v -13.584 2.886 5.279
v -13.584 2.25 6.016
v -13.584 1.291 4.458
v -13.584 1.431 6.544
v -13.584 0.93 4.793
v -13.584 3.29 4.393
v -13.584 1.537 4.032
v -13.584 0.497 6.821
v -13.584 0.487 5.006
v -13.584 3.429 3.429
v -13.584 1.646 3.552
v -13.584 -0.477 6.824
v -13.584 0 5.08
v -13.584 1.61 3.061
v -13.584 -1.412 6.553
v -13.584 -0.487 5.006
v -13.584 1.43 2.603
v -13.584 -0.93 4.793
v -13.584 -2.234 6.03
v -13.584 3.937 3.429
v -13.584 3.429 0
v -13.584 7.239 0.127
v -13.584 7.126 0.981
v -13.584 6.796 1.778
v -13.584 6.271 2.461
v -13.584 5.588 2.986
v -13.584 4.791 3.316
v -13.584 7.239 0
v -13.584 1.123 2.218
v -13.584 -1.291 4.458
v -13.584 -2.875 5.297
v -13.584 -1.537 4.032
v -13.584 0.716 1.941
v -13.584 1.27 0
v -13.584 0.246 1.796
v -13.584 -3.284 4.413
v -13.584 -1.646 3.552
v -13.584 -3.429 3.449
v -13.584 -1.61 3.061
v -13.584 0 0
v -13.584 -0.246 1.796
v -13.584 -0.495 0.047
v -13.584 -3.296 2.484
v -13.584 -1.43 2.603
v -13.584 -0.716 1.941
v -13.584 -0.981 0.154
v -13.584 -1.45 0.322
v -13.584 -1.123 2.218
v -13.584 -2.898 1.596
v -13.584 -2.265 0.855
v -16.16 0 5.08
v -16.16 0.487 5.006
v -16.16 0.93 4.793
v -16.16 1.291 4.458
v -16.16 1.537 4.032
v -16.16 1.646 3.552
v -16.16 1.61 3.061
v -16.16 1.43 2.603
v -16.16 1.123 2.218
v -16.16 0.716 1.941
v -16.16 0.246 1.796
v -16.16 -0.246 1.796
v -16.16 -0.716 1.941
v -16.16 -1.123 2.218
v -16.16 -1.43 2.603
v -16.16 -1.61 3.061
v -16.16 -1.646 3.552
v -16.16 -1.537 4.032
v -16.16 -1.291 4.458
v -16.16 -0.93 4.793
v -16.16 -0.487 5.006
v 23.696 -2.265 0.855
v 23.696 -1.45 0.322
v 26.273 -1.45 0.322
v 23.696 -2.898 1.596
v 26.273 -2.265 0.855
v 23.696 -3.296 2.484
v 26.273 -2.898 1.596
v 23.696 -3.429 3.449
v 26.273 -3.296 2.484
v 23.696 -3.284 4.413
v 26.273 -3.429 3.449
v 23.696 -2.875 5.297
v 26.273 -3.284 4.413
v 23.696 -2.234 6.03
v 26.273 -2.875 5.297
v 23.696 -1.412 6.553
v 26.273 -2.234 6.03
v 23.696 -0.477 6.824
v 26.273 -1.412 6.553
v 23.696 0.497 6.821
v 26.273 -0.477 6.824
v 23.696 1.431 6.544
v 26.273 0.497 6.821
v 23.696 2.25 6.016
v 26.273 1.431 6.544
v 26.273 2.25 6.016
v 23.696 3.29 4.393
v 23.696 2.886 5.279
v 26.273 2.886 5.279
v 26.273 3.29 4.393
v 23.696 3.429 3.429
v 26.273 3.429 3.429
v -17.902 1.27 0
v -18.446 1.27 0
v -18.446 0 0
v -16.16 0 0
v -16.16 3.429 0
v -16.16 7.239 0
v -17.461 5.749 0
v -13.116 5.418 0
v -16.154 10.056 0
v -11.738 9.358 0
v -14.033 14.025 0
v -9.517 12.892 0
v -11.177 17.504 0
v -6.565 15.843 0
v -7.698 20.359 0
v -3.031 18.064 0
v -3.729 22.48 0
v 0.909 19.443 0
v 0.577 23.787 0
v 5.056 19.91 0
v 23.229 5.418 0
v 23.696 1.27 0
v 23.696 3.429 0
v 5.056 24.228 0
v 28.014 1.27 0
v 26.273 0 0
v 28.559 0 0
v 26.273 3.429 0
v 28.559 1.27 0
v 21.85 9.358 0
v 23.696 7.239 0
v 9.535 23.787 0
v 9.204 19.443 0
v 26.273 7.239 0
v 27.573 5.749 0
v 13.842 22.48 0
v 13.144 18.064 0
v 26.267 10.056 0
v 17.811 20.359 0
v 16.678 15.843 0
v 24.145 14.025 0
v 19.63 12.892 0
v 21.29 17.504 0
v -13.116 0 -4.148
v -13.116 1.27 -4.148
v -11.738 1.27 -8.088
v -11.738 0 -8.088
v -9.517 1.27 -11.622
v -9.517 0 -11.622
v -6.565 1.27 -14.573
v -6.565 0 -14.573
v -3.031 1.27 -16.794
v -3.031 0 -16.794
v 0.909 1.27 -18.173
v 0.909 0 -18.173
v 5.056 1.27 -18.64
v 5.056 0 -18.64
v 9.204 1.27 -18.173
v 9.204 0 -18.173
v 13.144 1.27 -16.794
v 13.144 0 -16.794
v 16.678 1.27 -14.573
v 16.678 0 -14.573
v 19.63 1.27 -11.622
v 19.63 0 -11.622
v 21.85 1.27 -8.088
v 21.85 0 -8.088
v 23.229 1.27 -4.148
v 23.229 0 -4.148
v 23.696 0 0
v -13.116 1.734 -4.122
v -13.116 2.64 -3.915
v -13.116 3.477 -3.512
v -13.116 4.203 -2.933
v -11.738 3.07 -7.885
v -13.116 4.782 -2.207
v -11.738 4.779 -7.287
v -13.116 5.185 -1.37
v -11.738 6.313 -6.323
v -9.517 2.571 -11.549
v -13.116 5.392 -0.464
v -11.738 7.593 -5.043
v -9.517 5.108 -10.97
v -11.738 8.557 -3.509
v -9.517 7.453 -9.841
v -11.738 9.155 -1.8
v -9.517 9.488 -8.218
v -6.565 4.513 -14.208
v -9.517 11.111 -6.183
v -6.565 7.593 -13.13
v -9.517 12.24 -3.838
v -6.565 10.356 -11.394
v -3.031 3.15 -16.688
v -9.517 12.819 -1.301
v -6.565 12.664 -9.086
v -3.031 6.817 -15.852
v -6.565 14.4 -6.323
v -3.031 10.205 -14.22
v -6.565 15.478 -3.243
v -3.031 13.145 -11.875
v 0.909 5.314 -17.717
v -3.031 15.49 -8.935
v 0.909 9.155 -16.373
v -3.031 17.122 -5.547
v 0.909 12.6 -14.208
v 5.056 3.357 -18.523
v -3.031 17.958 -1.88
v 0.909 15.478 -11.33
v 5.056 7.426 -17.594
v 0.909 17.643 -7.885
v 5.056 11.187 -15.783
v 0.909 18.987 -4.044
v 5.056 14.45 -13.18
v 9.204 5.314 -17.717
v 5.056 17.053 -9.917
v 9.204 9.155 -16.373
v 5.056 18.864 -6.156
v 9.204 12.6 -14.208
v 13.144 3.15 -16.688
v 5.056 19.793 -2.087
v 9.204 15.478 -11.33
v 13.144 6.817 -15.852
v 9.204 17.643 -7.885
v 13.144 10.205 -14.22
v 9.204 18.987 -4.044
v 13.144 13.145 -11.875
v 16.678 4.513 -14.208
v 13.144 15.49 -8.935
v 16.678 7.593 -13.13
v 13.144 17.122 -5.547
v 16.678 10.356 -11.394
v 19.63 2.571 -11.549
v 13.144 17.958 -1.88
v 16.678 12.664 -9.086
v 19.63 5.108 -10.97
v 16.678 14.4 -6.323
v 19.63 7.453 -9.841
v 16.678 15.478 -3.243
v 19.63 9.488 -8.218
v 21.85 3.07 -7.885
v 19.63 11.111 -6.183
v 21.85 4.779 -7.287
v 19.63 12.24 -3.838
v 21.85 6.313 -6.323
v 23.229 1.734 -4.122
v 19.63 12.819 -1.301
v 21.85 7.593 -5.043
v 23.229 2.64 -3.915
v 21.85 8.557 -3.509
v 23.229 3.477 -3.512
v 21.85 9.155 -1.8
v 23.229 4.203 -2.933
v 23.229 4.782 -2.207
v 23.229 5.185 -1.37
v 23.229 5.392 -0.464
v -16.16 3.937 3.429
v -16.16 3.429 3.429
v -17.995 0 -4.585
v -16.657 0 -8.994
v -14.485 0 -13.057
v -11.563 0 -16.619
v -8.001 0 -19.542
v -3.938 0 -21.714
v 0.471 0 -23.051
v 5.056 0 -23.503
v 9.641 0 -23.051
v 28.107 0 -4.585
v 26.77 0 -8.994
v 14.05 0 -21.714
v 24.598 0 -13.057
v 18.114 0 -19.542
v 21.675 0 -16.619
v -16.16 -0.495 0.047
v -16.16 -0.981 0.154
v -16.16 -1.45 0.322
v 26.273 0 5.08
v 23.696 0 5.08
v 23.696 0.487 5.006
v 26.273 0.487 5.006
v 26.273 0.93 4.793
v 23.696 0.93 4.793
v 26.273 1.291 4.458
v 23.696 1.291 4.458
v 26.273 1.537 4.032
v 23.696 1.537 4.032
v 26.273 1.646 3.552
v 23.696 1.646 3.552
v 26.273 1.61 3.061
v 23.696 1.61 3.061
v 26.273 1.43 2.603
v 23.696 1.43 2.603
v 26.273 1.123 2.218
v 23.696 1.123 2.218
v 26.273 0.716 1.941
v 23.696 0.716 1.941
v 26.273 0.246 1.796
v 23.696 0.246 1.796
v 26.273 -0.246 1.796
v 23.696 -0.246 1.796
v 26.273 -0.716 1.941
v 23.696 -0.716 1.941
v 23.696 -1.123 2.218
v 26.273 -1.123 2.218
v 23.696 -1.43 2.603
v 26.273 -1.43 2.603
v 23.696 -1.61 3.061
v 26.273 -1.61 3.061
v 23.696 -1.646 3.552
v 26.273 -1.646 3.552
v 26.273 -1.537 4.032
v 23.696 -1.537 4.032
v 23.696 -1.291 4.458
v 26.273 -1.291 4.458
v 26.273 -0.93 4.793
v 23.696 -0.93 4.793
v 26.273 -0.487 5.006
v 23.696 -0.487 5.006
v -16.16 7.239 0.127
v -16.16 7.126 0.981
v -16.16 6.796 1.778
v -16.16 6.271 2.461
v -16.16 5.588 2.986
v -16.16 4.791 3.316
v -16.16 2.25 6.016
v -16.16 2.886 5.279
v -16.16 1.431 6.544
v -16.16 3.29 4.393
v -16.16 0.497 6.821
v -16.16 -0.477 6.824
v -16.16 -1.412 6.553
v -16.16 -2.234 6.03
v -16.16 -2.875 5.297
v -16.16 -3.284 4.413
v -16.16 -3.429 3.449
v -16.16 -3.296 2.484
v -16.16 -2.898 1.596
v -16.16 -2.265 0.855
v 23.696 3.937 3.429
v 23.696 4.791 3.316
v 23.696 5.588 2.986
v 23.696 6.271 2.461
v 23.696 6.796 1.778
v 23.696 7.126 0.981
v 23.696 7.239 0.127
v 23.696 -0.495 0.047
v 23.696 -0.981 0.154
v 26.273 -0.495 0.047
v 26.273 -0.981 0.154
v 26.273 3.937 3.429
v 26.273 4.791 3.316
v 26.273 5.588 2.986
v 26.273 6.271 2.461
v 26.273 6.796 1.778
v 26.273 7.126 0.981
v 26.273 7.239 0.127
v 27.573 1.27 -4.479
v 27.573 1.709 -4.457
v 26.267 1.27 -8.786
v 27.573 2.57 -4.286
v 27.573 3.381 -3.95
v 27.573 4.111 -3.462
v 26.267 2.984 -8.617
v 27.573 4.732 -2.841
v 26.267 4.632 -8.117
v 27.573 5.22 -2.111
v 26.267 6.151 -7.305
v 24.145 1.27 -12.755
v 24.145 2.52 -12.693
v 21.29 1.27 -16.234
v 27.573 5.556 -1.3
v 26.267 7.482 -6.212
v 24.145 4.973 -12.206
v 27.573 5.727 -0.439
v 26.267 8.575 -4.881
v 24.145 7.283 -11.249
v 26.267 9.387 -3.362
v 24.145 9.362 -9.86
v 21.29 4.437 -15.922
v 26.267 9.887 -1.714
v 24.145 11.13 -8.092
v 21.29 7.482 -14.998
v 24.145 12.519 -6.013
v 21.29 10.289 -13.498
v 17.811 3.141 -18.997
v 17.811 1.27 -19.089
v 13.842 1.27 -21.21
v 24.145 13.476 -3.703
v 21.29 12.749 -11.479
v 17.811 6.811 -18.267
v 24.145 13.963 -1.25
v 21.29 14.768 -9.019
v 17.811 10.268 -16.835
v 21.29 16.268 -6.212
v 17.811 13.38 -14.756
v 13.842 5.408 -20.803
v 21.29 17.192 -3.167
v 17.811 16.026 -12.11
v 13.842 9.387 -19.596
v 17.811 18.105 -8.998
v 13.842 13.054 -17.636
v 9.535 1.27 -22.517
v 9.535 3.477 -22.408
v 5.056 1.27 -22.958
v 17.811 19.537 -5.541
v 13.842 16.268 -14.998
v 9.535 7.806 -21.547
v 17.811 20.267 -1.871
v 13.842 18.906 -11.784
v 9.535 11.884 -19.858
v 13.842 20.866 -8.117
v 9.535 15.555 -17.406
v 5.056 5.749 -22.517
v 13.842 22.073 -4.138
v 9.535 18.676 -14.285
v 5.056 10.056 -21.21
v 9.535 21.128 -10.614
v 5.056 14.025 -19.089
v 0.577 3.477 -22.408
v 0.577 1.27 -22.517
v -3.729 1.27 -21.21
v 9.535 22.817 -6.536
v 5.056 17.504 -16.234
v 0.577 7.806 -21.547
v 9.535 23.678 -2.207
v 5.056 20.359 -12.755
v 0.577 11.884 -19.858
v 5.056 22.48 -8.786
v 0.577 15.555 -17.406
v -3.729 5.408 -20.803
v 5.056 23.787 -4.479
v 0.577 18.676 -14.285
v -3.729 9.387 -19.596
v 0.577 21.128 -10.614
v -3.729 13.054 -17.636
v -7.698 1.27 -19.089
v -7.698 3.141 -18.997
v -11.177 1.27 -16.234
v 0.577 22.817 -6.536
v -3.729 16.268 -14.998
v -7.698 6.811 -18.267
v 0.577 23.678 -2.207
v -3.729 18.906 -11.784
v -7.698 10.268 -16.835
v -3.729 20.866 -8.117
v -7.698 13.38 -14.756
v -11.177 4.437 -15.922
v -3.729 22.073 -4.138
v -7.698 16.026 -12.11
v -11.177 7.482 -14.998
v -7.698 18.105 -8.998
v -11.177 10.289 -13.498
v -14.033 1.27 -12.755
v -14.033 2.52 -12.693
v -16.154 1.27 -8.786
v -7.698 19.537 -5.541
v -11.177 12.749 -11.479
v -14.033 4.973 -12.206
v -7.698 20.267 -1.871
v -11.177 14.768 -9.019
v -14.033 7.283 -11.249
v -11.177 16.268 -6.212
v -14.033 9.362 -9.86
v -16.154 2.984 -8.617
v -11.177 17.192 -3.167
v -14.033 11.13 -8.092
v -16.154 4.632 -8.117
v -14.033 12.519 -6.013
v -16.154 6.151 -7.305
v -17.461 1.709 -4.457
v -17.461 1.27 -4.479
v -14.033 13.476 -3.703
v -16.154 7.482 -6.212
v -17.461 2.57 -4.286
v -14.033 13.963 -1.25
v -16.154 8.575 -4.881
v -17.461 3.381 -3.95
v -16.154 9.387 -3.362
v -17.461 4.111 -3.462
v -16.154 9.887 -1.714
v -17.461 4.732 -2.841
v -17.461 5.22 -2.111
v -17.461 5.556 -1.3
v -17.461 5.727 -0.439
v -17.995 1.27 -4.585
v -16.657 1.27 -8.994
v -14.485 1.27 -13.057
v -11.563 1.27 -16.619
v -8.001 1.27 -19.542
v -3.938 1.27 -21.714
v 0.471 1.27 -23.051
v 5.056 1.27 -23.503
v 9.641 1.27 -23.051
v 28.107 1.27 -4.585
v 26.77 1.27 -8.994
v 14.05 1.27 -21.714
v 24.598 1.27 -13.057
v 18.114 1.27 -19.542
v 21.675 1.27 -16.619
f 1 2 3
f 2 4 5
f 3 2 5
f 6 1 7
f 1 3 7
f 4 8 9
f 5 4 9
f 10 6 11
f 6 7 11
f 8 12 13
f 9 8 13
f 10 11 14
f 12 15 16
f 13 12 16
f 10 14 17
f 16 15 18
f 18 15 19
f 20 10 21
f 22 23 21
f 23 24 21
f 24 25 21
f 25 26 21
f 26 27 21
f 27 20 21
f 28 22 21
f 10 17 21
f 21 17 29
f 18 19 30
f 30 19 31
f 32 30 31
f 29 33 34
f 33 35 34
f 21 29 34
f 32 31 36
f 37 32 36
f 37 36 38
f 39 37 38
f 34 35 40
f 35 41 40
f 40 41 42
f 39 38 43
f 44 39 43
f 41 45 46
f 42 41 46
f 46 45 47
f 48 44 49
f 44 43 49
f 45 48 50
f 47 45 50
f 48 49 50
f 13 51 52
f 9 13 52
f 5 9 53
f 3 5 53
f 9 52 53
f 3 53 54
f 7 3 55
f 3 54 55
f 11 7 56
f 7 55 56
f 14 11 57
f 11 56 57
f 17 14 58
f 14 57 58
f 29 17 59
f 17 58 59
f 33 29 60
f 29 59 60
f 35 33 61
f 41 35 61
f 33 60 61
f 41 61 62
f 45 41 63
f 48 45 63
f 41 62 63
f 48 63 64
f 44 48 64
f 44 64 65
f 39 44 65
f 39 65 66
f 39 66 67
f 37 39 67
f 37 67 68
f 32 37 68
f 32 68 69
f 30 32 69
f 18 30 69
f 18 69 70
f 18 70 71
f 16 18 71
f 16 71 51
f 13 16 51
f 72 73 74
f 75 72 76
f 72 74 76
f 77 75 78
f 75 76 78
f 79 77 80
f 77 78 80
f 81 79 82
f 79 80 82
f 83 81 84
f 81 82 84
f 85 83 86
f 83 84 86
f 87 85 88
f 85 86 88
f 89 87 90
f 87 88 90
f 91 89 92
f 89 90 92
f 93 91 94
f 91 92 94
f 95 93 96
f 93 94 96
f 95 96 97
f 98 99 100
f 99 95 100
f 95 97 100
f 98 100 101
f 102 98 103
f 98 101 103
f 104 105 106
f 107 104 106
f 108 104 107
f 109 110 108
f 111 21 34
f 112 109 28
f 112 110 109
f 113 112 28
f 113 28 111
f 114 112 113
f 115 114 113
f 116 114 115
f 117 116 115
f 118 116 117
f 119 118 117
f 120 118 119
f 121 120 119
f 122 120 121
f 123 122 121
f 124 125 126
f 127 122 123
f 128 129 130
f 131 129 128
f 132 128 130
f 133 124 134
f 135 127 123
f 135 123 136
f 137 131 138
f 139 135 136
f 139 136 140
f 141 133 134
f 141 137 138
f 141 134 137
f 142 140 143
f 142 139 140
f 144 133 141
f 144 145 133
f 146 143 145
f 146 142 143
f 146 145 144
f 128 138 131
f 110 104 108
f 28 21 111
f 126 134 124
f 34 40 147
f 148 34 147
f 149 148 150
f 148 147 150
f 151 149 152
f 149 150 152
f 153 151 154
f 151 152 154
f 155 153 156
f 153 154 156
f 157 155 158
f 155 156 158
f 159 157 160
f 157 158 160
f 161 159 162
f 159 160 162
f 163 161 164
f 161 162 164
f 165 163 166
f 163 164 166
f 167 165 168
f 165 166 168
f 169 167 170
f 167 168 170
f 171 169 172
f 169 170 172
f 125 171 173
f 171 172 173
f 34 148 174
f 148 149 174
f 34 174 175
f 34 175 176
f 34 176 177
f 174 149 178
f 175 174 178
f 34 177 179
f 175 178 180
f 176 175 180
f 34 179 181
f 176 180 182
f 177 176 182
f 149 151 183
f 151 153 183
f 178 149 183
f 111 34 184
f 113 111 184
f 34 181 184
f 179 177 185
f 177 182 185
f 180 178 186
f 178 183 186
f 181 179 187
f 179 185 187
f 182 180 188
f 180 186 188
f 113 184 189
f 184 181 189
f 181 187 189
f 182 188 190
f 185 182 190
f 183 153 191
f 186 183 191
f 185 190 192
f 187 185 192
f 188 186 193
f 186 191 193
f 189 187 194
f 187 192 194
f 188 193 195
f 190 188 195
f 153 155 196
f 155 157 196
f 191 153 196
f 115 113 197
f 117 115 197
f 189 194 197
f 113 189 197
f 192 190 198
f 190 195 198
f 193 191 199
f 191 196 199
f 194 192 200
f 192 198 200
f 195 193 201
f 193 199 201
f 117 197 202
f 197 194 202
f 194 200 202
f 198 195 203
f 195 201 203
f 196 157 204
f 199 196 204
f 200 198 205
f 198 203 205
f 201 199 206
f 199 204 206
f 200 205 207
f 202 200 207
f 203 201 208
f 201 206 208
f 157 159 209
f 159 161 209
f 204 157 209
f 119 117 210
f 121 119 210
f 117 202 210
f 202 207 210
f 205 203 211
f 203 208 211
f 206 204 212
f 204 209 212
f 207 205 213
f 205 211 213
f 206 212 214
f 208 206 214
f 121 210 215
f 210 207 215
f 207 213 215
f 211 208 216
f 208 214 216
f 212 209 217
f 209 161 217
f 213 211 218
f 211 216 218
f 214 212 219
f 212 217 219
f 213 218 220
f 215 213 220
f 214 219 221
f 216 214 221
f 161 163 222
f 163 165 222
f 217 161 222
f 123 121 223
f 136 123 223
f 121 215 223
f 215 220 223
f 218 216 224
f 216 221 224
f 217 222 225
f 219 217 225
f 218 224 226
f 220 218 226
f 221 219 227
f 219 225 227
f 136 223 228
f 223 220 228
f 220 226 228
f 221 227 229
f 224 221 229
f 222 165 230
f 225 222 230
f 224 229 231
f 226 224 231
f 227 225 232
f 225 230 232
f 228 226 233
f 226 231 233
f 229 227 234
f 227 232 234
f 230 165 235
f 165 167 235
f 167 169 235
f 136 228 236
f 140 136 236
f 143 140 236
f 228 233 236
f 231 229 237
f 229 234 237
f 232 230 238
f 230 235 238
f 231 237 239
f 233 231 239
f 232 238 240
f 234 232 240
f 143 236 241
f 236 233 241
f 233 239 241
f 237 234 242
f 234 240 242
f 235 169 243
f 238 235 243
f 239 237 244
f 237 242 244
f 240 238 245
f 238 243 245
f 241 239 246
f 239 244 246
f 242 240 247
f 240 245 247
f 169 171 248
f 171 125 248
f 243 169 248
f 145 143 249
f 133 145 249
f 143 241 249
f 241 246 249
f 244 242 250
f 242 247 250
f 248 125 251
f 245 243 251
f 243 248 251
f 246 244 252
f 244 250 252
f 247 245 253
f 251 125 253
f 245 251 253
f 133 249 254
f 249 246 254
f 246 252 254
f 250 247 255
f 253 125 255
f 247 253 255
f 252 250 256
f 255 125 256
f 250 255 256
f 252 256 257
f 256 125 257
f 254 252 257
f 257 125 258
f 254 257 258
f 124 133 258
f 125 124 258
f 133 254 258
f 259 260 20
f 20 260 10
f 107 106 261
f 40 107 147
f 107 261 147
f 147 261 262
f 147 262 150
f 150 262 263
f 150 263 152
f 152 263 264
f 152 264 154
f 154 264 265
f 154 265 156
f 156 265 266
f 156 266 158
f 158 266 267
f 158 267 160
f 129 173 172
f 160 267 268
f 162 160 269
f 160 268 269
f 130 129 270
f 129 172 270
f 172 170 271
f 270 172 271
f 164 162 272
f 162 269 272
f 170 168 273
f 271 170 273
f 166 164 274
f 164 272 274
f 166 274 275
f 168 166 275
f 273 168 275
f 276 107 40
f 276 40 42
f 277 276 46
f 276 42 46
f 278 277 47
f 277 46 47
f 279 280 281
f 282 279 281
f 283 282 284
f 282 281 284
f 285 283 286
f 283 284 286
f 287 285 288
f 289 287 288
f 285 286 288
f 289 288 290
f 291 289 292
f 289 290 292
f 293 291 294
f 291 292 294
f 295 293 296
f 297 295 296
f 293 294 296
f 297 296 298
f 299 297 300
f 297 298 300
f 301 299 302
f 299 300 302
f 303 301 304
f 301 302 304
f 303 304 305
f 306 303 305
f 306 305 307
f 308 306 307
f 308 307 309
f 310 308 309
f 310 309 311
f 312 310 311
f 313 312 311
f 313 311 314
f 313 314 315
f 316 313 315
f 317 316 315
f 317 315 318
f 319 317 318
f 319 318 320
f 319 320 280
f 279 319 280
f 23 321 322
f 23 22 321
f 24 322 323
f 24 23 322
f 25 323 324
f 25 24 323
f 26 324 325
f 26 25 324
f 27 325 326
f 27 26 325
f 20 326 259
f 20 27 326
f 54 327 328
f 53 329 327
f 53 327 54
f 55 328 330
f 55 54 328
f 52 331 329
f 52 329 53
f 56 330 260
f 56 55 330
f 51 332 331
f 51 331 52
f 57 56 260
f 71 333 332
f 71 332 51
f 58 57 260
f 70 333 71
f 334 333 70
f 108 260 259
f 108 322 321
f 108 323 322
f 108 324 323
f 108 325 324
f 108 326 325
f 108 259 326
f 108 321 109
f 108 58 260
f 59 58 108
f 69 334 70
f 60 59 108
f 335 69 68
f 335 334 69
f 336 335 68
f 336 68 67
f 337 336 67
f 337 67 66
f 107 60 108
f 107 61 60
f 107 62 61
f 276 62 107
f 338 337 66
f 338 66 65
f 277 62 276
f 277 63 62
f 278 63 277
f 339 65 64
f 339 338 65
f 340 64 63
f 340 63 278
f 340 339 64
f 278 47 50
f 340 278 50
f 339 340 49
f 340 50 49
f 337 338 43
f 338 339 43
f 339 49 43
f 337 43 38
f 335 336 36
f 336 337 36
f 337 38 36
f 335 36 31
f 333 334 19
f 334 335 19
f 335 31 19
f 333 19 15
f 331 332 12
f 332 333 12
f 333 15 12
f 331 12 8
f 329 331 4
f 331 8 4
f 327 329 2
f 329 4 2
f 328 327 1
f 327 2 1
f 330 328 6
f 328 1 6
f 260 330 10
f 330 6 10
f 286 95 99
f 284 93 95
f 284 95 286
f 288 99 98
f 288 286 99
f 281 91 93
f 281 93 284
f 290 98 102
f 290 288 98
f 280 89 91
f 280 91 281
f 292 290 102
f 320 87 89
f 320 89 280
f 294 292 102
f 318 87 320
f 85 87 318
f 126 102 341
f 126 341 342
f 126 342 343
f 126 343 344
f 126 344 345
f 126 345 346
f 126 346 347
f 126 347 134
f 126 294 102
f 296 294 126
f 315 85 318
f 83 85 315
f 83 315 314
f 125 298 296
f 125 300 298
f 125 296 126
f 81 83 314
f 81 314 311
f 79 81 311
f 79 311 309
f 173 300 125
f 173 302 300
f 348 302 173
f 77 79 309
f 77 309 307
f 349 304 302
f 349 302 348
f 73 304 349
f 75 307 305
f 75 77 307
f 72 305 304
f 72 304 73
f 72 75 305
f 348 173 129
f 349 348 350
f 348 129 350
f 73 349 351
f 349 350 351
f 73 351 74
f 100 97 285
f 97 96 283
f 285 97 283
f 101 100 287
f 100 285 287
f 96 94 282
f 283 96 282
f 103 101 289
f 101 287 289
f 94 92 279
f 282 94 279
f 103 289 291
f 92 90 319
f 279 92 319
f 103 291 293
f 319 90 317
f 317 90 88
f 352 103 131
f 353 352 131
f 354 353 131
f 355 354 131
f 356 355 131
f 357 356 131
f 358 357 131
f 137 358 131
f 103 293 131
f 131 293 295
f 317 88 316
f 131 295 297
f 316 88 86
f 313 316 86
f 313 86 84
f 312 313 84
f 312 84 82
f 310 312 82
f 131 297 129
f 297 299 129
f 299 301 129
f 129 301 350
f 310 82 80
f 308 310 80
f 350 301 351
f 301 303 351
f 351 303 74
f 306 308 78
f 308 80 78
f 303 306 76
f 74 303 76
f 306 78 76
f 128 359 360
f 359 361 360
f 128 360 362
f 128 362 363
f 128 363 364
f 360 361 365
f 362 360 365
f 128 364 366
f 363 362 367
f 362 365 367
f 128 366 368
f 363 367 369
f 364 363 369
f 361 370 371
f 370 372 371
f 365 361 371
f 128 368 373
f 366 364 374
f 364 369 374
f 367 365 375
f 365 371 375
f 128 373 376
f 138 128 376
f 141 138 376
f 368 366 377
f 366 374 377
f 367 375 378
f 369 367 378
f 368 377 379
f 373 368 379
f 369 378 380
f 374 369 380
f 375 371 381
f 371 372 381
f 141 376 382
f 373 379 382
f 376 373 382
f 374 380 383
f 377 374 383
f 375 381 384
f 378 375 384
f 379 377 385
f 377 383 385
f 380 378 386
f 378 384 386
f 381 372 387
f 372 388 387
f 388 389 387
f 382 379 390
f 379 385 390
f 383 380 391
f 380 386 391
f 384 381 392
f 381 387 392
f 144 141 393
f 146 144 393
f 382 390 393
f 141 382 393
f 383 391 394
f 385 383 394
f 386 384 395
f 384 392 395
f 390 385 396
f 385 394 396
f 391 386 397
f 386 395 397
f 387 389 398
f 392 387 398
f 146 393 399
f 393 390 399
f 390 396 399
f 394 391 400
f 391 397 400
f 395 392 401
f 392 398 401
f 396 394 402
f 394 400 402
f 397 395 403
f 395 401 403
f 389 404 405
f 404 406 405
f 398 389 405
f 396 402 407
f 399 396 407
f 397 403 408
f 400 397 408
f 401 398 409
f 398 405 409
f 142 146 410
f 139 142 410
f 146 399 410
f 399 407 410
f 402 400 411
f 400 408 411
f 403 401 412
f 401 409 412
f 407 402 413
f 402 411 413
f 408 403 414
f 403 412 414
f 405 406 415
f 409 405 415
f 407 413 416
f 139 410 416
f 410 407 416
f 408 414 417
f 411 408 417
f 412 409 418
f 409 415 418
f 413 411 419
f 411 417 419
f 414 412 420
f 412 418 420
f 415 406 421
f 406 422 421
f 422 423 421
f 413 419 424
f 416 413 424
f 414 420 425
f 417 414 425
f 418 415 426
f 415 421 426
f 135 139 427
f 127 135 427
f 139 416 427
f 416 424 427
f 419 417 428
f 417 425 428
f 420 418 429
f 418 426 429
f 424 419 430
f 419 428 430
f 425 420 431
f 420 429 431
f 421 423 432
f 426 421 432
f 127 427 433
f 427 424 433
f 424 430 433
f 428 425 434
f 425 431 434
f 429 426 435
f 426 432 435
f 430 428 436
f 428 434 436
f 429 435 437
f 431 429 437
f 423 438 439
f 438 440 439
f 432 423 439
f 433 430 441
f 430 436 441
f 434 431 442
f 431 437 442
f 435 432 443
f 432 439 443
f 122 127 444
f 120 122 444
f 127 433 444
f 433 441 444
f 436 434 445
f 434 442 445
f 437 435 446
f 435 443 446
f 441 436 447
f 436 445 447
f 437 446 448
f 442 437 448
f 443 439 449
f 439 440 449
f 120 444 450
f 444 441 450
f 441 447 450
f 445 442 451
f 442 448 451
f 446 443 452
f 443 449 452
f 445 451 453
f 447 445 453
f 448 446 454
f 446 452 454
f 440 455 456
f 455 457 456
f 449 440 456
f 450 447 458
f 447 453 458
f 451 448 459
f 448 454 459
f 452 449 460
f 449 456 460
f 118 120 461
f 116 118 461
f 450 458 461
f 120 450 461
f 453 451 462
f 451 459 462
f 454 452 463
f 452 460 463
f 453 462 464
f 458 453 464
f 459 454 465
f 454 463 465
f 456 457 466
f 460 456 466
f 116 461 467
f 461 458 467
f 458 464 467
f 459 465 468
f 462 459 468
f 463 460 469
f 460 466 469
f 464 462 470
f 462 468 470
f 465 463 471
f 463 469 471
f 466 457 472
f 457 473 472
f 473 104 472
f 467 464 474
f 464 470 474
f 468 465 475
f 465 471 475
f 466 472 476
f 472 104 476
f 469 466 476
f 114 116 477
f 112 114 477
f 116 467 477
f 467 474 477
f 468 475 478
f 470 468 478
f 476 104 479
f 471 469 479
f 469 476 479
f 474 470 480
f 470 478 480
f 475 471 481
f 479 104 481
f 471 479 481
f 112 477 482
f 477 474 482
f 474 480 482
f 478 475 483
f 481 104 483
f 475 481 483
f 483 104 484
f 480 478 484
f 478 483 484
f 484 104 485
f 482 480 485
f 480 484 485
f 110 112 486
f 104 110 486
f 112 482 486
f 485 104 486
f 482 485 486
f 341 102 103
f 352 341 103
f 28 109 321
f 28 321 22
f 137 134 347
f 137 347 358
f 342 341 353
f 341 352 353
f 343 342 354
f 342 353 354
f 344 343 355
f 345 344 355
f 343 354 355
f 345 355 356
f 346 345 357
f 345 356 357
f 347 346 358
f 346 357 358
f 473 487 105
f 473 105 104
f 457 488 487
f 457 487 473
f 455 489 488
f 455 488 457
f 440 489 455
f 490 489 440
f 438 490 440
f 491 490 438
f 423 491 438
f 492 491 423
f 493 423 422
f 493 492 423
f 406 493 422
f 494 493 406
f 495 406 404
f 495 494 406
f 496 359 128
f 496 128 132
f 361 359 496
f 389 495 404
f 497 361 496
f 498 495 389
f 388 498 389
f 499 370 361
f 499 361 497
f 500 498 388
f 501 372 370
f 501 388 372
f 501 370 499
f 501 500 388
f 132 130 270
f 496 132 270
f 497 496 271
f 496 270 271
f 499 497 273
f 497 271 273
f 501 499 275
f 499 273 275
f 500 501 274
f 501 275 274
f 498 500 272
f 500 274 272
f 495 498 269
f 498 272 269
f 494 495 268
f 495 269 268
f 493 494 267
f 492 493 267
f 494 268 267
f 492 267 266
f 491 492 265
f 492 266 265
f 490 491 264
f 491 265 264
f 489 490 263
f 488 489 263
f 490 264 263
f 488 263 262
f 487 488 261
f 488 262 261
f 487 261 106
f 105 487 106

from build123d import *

# Parameters (mm, degrees)
BOSS_EXTRUDE1_DEPTH      = 1.27
REVOLVE3_ANGLE           = 90
SKETCH6_W                = 4.862612613
SKETCH6_H                = 1.27
BOSS_EXTRUDE3_DEPTH      = 7.935530078
BOSS_EXTRUDE4_DEPTH      = 3.81
BOSS_EXTRUDE4_DEPTH_BACK = 6.35
SKETCH10_W               = 4.862612613
SKETCH10_H               = 7.935530078
FILLET7_R                = 5.08
FILLET10_R               = 5.08
SKETCH13_R               = 1.651
CUT_EXTRUDE2_DEPTH       = 55.372
SKETCH14_W               = 2.286
SKETCH14_H               = 11.368095807
CUT_EXTRUDE3_DEPTH       = 55.372
FILLET15_RADIUS          = 3.967765039
FILLET15_LENGTH          = 2.576612613
FILLET16_RADIUS          = 3.967765039
FILLET16_LENGTH          = 2.576612613
CUT_EXTRUDE4_DEPTH       = 55.372
CUT_EXTRUDE7_DEPTH       = 55.88
SKETCH19_W               = 2.576612613
SKETCH19_H               = 3.428576371
BOSS_EXTRUDE5_DEPTH      = 3.81
FILLET17_R               = 3.302
FILLET18_R               = 3.302


with BuildPart() as part:
    # Sketch1 → Boss-Extrude1 (new body)
    with BuildSketch(Plane(origin=(0, 0, 0), x_dir=(1, 0, 0), z_dir=(0, 1, 0))):
        with BuildLine():
            Line((-18.44626818, 0), (-13.583655567, 0))
            ThreePointArc((-13.583655567, 0), (5.056359448, 18.640015015), (23.696374463, 0))
            Line((23.696374463, 0), (28.558987076, 0))
            ThreePointArc((28.558987076, 0), (5.056359448, 23.502627628), (-18.44626818, 0))
        make_face()
    extrude(amount=BOSS_EXTRUDE1_DEPTH)

    # Sketch4 → Revolve3 (revolve)
    with BuildSketch(Plane(origin=(0, 1.27, 0), x_dir=(1, 0, 0), z_dir=(0, 1, 0))):
        with BuildLine():
            Line((23.696374463, 0), (28.014374463, 0))
            ThreePointArc((28.014374463, 0), (5.056359448, 22.958015015), (-17.901655567, 0))
            Line((-17.901655567, 0), (-13.583655567, 0))
            ThreePointArc((-13.583655567, 0), (5.056359448, 18.640015015), (23.696374463, 0))
        make_face()
    revolve(axis=Axis((-17.901655567, 1.27, 0), (1, 0, 0)), revolution_arc=REVOLVE3_ANGLE)

    # Sketch6 → Boss-Extrude3 (add)
    with BuildSketch(Plane.XY):
        with Locations((-16.014961873, 0.635)):
            Rectangle(SKETCH6_W, SKETCH6_H)
        with Locations((26.12768077, 0.635)):
            Rectangle(SKETCH6_W, SKETCH6_H)
    extrude(amount=BOSS_EXTRUDE3_DEPTH)

    # Sketch10 → Boss-Extrude4 (add, two sides: drawn at the far end of the back side and taken through both)
    with BuildSketch(Plane(origin=(0, 1.27, 0), x_dir=(1, 0, 0), z_dir=(0, 1, 0)).offset(-BOSS_EXTRUDE4_DEPTH_BACK)):
        with Locations((-16.014961873, -3.967765039)):
            Rectangle(SKETCH10_W, SKETCH10_H)
        with Locations((26.12768077, -3.967765039)):
            Rectangle(SKETCH10_W, SKETCH10_H)
    extrude(amount=BOSS_EXTRUDE4_DEPTH + BOSS_EXTRUDE4_DEPTH_BACK)

    # Fillet7
    fillet7_edges = [part.edges().sort_by_distance(p)[0] for p in [
        (-16.014961873, 5.08, 7.935530078),
    ]]
    fillet(fillet7_edges, radius=FILLET7_R)

    # Fillet10
    fillet10_edges = [part.edges().sort_by_distance(p)[0] for p in [
        (26.127680769, 5.08, 7.935530078),
    ]]
    fillet(fillet10_edges, radius=FILLET10_R)

    # Sketch13 → Cut-Extrude2 (cut)
    with BuildSketch(Plane.ZY.offset(18.44626818)):
        with Locations((3.428576371, 0)):
            Circle(SKETCH13_R)
    extrude(amount=-CUT_EXTRUDE2_DEPTH, mode=Mode.SUBTRACT)

    # Sketch14 → Cut-Extrude3 (cut)
    with BuildSketch(Plane(origin=(0, 5.08, 0), x_dir=(1, 0, 0), z_dir=(0, 1, 0))):
        with Locations((27.415987076, -5.684047904)):
            Rectangle(SKETCH14_W, SKETCH14_H)
        with Locations((-17.30326818, -5.684047904)):
            Rectangle(SKETCH14_W, SKETCH14_H)
    extrude(amount=-CUT_EXTRUDE3_DEPTH, mode=Mode.SUBTRACT)

    # Fillet15: full round fillet: the end face becomes a half cylinder, R = half its width
    fillet15_face = Plane((24.984680769, -5.08, 3.967765039), x_dir=(1, 0, 0), z_dir=(0, -1, 0))  # on the end face: x along it, z out of the body
    fillet15_slab = fillet15_face.offset(-FILLET15_RADIUS / 2) * Box(FILLET15_LENGTH, 2 * FILLET15_RADIUS, FILLET15_RADIUS, mode=Mode.PRIVATE)  # the body's end, R deep
    fillet15_round = Plane((24.984680769, -1.112234961, 3.967765039), x_dir=(0, -1, 0), z_dir=(1, 0, 0)) * Cylinder(FILLET15_RADIUS, FILLET15_LENGTH, mode=Mode.PRIVATE)  # its axis R under the face
    add(fillet15_slab - fillet15_round, mode=Mode.SUBTRACT)

    # Fillet16: full round fillet: the end face becomes a half cylinder, R = half its width
    fillet16_face = Plane((-14.871961873, -5.08, 3.967765039), x_dir=(-1, 0, 0), z_dir=(0, -1, 0))  # on the end face: x along it, z out of the body
    fillet16_slab = fillet16_face.offset(-FILLET16_RADIUS / 2) * Box(FILLET16_LENGTH, 2 * FILLET16_RADIUS, FILLET16_RADIUS, mode=Mode.PRIVATE)  # the body's end, R deep
    fillet16_round = Plane((-14.871961873, -1.112234961, 3.967765039), x_dir=(0, -1, 0), z_dir=(-1, 0, 0)) * Cylinder(FILLET16_RADIUS, FILLET16_LENGTH, mode=Mode.PRIVATE)  # its axis R under the face
    add(fillet16_slab - fillet16_round, mode=Mode.SUBTRACT)

    # Sketch16 → Cut-Extrude4 (cut)
    with BuildSketch(Plane(origin=(26.272987076, 0, 0), x_dir=(0, 0, -1), z_dir=(1, 0, 0))):
        with BuildLine():
            ThreePointArc((0, 0), (-3.716578938, -3.862364093), (-7.935530078, -0.55611748))
            ThreePointArc((-7.935530078, -0.55611748), (-3.630565744, -5.089731167), (0, 0))
        make_face()
    extrude(amount=-CUT_EXTRUDE4_DEPTH, mode=Mode.SUBTRACT)

    # Sketch18 → Cut-Extrude7 (cut)
    with BuildSketch(Plane(origin=(26.272987076, 0, 0), x_dir=(0, 0, -1), z_dir=(1, 0, 0))):
        with BuildLine():
            Line((-3.428576371, 3.428576371), (0, 3.428576371))
            Line((0, 3.428576371), (0, 5.467356317))
            Line((0, 5.467356317), (-9.031573881, 5.467356317))
            Line((-9.031573881, 5.467356317), (-9.031573881, -4.486785293))
            Line((-9.031573881, -4.486785293), (0, -4.486785293))
            Line((0, -4.486785293), (0, 0))
            ThreePointArc((0, 0), (-5.852945973, -2.424369602), (-3.428576371, 3.428576371))
        make_face()
    extrude(amount=-CUT_EXTRUDE7_DEPTH, mode=Mode.SUBTRACT)

    # Sketch19 → Boss-Extrude5 (add)
    with BuildSketch(Plane(origin=(0, 3.428576371, 0), x_dir=(1, 0, 0), z_dir=(0, 1, 0))):
        with Locations((24.98468077, -1.714288186)):
            Rectangle(SKETCH19_W, SKETCH19_H)
        with Locations((-14.871961874, -1.714288186)):
            Rectangle(SKETCH19_W, SKETCH19_H)
    extrude(amount=BOSS_EXTRUDE5_DEPTH)

    # Fillet17
    fillet17_edges = [part.edges().sort_by_distance(p)[0] for p in [
        (24.984680769, 7.238576371, 3.428576371),
    ]]
    fillet(fillet17_edges, radius=FILLET17_R)

    # Fillet18
    fillet18_edges = [part.edges().sort_by_distance(p)[0] for p in [
        (-14.871961873, 7.238576371, 3.428576371),
    ]]
    fillet(fillet18_edges, radius=FILLET18_R)


solid = part.part
